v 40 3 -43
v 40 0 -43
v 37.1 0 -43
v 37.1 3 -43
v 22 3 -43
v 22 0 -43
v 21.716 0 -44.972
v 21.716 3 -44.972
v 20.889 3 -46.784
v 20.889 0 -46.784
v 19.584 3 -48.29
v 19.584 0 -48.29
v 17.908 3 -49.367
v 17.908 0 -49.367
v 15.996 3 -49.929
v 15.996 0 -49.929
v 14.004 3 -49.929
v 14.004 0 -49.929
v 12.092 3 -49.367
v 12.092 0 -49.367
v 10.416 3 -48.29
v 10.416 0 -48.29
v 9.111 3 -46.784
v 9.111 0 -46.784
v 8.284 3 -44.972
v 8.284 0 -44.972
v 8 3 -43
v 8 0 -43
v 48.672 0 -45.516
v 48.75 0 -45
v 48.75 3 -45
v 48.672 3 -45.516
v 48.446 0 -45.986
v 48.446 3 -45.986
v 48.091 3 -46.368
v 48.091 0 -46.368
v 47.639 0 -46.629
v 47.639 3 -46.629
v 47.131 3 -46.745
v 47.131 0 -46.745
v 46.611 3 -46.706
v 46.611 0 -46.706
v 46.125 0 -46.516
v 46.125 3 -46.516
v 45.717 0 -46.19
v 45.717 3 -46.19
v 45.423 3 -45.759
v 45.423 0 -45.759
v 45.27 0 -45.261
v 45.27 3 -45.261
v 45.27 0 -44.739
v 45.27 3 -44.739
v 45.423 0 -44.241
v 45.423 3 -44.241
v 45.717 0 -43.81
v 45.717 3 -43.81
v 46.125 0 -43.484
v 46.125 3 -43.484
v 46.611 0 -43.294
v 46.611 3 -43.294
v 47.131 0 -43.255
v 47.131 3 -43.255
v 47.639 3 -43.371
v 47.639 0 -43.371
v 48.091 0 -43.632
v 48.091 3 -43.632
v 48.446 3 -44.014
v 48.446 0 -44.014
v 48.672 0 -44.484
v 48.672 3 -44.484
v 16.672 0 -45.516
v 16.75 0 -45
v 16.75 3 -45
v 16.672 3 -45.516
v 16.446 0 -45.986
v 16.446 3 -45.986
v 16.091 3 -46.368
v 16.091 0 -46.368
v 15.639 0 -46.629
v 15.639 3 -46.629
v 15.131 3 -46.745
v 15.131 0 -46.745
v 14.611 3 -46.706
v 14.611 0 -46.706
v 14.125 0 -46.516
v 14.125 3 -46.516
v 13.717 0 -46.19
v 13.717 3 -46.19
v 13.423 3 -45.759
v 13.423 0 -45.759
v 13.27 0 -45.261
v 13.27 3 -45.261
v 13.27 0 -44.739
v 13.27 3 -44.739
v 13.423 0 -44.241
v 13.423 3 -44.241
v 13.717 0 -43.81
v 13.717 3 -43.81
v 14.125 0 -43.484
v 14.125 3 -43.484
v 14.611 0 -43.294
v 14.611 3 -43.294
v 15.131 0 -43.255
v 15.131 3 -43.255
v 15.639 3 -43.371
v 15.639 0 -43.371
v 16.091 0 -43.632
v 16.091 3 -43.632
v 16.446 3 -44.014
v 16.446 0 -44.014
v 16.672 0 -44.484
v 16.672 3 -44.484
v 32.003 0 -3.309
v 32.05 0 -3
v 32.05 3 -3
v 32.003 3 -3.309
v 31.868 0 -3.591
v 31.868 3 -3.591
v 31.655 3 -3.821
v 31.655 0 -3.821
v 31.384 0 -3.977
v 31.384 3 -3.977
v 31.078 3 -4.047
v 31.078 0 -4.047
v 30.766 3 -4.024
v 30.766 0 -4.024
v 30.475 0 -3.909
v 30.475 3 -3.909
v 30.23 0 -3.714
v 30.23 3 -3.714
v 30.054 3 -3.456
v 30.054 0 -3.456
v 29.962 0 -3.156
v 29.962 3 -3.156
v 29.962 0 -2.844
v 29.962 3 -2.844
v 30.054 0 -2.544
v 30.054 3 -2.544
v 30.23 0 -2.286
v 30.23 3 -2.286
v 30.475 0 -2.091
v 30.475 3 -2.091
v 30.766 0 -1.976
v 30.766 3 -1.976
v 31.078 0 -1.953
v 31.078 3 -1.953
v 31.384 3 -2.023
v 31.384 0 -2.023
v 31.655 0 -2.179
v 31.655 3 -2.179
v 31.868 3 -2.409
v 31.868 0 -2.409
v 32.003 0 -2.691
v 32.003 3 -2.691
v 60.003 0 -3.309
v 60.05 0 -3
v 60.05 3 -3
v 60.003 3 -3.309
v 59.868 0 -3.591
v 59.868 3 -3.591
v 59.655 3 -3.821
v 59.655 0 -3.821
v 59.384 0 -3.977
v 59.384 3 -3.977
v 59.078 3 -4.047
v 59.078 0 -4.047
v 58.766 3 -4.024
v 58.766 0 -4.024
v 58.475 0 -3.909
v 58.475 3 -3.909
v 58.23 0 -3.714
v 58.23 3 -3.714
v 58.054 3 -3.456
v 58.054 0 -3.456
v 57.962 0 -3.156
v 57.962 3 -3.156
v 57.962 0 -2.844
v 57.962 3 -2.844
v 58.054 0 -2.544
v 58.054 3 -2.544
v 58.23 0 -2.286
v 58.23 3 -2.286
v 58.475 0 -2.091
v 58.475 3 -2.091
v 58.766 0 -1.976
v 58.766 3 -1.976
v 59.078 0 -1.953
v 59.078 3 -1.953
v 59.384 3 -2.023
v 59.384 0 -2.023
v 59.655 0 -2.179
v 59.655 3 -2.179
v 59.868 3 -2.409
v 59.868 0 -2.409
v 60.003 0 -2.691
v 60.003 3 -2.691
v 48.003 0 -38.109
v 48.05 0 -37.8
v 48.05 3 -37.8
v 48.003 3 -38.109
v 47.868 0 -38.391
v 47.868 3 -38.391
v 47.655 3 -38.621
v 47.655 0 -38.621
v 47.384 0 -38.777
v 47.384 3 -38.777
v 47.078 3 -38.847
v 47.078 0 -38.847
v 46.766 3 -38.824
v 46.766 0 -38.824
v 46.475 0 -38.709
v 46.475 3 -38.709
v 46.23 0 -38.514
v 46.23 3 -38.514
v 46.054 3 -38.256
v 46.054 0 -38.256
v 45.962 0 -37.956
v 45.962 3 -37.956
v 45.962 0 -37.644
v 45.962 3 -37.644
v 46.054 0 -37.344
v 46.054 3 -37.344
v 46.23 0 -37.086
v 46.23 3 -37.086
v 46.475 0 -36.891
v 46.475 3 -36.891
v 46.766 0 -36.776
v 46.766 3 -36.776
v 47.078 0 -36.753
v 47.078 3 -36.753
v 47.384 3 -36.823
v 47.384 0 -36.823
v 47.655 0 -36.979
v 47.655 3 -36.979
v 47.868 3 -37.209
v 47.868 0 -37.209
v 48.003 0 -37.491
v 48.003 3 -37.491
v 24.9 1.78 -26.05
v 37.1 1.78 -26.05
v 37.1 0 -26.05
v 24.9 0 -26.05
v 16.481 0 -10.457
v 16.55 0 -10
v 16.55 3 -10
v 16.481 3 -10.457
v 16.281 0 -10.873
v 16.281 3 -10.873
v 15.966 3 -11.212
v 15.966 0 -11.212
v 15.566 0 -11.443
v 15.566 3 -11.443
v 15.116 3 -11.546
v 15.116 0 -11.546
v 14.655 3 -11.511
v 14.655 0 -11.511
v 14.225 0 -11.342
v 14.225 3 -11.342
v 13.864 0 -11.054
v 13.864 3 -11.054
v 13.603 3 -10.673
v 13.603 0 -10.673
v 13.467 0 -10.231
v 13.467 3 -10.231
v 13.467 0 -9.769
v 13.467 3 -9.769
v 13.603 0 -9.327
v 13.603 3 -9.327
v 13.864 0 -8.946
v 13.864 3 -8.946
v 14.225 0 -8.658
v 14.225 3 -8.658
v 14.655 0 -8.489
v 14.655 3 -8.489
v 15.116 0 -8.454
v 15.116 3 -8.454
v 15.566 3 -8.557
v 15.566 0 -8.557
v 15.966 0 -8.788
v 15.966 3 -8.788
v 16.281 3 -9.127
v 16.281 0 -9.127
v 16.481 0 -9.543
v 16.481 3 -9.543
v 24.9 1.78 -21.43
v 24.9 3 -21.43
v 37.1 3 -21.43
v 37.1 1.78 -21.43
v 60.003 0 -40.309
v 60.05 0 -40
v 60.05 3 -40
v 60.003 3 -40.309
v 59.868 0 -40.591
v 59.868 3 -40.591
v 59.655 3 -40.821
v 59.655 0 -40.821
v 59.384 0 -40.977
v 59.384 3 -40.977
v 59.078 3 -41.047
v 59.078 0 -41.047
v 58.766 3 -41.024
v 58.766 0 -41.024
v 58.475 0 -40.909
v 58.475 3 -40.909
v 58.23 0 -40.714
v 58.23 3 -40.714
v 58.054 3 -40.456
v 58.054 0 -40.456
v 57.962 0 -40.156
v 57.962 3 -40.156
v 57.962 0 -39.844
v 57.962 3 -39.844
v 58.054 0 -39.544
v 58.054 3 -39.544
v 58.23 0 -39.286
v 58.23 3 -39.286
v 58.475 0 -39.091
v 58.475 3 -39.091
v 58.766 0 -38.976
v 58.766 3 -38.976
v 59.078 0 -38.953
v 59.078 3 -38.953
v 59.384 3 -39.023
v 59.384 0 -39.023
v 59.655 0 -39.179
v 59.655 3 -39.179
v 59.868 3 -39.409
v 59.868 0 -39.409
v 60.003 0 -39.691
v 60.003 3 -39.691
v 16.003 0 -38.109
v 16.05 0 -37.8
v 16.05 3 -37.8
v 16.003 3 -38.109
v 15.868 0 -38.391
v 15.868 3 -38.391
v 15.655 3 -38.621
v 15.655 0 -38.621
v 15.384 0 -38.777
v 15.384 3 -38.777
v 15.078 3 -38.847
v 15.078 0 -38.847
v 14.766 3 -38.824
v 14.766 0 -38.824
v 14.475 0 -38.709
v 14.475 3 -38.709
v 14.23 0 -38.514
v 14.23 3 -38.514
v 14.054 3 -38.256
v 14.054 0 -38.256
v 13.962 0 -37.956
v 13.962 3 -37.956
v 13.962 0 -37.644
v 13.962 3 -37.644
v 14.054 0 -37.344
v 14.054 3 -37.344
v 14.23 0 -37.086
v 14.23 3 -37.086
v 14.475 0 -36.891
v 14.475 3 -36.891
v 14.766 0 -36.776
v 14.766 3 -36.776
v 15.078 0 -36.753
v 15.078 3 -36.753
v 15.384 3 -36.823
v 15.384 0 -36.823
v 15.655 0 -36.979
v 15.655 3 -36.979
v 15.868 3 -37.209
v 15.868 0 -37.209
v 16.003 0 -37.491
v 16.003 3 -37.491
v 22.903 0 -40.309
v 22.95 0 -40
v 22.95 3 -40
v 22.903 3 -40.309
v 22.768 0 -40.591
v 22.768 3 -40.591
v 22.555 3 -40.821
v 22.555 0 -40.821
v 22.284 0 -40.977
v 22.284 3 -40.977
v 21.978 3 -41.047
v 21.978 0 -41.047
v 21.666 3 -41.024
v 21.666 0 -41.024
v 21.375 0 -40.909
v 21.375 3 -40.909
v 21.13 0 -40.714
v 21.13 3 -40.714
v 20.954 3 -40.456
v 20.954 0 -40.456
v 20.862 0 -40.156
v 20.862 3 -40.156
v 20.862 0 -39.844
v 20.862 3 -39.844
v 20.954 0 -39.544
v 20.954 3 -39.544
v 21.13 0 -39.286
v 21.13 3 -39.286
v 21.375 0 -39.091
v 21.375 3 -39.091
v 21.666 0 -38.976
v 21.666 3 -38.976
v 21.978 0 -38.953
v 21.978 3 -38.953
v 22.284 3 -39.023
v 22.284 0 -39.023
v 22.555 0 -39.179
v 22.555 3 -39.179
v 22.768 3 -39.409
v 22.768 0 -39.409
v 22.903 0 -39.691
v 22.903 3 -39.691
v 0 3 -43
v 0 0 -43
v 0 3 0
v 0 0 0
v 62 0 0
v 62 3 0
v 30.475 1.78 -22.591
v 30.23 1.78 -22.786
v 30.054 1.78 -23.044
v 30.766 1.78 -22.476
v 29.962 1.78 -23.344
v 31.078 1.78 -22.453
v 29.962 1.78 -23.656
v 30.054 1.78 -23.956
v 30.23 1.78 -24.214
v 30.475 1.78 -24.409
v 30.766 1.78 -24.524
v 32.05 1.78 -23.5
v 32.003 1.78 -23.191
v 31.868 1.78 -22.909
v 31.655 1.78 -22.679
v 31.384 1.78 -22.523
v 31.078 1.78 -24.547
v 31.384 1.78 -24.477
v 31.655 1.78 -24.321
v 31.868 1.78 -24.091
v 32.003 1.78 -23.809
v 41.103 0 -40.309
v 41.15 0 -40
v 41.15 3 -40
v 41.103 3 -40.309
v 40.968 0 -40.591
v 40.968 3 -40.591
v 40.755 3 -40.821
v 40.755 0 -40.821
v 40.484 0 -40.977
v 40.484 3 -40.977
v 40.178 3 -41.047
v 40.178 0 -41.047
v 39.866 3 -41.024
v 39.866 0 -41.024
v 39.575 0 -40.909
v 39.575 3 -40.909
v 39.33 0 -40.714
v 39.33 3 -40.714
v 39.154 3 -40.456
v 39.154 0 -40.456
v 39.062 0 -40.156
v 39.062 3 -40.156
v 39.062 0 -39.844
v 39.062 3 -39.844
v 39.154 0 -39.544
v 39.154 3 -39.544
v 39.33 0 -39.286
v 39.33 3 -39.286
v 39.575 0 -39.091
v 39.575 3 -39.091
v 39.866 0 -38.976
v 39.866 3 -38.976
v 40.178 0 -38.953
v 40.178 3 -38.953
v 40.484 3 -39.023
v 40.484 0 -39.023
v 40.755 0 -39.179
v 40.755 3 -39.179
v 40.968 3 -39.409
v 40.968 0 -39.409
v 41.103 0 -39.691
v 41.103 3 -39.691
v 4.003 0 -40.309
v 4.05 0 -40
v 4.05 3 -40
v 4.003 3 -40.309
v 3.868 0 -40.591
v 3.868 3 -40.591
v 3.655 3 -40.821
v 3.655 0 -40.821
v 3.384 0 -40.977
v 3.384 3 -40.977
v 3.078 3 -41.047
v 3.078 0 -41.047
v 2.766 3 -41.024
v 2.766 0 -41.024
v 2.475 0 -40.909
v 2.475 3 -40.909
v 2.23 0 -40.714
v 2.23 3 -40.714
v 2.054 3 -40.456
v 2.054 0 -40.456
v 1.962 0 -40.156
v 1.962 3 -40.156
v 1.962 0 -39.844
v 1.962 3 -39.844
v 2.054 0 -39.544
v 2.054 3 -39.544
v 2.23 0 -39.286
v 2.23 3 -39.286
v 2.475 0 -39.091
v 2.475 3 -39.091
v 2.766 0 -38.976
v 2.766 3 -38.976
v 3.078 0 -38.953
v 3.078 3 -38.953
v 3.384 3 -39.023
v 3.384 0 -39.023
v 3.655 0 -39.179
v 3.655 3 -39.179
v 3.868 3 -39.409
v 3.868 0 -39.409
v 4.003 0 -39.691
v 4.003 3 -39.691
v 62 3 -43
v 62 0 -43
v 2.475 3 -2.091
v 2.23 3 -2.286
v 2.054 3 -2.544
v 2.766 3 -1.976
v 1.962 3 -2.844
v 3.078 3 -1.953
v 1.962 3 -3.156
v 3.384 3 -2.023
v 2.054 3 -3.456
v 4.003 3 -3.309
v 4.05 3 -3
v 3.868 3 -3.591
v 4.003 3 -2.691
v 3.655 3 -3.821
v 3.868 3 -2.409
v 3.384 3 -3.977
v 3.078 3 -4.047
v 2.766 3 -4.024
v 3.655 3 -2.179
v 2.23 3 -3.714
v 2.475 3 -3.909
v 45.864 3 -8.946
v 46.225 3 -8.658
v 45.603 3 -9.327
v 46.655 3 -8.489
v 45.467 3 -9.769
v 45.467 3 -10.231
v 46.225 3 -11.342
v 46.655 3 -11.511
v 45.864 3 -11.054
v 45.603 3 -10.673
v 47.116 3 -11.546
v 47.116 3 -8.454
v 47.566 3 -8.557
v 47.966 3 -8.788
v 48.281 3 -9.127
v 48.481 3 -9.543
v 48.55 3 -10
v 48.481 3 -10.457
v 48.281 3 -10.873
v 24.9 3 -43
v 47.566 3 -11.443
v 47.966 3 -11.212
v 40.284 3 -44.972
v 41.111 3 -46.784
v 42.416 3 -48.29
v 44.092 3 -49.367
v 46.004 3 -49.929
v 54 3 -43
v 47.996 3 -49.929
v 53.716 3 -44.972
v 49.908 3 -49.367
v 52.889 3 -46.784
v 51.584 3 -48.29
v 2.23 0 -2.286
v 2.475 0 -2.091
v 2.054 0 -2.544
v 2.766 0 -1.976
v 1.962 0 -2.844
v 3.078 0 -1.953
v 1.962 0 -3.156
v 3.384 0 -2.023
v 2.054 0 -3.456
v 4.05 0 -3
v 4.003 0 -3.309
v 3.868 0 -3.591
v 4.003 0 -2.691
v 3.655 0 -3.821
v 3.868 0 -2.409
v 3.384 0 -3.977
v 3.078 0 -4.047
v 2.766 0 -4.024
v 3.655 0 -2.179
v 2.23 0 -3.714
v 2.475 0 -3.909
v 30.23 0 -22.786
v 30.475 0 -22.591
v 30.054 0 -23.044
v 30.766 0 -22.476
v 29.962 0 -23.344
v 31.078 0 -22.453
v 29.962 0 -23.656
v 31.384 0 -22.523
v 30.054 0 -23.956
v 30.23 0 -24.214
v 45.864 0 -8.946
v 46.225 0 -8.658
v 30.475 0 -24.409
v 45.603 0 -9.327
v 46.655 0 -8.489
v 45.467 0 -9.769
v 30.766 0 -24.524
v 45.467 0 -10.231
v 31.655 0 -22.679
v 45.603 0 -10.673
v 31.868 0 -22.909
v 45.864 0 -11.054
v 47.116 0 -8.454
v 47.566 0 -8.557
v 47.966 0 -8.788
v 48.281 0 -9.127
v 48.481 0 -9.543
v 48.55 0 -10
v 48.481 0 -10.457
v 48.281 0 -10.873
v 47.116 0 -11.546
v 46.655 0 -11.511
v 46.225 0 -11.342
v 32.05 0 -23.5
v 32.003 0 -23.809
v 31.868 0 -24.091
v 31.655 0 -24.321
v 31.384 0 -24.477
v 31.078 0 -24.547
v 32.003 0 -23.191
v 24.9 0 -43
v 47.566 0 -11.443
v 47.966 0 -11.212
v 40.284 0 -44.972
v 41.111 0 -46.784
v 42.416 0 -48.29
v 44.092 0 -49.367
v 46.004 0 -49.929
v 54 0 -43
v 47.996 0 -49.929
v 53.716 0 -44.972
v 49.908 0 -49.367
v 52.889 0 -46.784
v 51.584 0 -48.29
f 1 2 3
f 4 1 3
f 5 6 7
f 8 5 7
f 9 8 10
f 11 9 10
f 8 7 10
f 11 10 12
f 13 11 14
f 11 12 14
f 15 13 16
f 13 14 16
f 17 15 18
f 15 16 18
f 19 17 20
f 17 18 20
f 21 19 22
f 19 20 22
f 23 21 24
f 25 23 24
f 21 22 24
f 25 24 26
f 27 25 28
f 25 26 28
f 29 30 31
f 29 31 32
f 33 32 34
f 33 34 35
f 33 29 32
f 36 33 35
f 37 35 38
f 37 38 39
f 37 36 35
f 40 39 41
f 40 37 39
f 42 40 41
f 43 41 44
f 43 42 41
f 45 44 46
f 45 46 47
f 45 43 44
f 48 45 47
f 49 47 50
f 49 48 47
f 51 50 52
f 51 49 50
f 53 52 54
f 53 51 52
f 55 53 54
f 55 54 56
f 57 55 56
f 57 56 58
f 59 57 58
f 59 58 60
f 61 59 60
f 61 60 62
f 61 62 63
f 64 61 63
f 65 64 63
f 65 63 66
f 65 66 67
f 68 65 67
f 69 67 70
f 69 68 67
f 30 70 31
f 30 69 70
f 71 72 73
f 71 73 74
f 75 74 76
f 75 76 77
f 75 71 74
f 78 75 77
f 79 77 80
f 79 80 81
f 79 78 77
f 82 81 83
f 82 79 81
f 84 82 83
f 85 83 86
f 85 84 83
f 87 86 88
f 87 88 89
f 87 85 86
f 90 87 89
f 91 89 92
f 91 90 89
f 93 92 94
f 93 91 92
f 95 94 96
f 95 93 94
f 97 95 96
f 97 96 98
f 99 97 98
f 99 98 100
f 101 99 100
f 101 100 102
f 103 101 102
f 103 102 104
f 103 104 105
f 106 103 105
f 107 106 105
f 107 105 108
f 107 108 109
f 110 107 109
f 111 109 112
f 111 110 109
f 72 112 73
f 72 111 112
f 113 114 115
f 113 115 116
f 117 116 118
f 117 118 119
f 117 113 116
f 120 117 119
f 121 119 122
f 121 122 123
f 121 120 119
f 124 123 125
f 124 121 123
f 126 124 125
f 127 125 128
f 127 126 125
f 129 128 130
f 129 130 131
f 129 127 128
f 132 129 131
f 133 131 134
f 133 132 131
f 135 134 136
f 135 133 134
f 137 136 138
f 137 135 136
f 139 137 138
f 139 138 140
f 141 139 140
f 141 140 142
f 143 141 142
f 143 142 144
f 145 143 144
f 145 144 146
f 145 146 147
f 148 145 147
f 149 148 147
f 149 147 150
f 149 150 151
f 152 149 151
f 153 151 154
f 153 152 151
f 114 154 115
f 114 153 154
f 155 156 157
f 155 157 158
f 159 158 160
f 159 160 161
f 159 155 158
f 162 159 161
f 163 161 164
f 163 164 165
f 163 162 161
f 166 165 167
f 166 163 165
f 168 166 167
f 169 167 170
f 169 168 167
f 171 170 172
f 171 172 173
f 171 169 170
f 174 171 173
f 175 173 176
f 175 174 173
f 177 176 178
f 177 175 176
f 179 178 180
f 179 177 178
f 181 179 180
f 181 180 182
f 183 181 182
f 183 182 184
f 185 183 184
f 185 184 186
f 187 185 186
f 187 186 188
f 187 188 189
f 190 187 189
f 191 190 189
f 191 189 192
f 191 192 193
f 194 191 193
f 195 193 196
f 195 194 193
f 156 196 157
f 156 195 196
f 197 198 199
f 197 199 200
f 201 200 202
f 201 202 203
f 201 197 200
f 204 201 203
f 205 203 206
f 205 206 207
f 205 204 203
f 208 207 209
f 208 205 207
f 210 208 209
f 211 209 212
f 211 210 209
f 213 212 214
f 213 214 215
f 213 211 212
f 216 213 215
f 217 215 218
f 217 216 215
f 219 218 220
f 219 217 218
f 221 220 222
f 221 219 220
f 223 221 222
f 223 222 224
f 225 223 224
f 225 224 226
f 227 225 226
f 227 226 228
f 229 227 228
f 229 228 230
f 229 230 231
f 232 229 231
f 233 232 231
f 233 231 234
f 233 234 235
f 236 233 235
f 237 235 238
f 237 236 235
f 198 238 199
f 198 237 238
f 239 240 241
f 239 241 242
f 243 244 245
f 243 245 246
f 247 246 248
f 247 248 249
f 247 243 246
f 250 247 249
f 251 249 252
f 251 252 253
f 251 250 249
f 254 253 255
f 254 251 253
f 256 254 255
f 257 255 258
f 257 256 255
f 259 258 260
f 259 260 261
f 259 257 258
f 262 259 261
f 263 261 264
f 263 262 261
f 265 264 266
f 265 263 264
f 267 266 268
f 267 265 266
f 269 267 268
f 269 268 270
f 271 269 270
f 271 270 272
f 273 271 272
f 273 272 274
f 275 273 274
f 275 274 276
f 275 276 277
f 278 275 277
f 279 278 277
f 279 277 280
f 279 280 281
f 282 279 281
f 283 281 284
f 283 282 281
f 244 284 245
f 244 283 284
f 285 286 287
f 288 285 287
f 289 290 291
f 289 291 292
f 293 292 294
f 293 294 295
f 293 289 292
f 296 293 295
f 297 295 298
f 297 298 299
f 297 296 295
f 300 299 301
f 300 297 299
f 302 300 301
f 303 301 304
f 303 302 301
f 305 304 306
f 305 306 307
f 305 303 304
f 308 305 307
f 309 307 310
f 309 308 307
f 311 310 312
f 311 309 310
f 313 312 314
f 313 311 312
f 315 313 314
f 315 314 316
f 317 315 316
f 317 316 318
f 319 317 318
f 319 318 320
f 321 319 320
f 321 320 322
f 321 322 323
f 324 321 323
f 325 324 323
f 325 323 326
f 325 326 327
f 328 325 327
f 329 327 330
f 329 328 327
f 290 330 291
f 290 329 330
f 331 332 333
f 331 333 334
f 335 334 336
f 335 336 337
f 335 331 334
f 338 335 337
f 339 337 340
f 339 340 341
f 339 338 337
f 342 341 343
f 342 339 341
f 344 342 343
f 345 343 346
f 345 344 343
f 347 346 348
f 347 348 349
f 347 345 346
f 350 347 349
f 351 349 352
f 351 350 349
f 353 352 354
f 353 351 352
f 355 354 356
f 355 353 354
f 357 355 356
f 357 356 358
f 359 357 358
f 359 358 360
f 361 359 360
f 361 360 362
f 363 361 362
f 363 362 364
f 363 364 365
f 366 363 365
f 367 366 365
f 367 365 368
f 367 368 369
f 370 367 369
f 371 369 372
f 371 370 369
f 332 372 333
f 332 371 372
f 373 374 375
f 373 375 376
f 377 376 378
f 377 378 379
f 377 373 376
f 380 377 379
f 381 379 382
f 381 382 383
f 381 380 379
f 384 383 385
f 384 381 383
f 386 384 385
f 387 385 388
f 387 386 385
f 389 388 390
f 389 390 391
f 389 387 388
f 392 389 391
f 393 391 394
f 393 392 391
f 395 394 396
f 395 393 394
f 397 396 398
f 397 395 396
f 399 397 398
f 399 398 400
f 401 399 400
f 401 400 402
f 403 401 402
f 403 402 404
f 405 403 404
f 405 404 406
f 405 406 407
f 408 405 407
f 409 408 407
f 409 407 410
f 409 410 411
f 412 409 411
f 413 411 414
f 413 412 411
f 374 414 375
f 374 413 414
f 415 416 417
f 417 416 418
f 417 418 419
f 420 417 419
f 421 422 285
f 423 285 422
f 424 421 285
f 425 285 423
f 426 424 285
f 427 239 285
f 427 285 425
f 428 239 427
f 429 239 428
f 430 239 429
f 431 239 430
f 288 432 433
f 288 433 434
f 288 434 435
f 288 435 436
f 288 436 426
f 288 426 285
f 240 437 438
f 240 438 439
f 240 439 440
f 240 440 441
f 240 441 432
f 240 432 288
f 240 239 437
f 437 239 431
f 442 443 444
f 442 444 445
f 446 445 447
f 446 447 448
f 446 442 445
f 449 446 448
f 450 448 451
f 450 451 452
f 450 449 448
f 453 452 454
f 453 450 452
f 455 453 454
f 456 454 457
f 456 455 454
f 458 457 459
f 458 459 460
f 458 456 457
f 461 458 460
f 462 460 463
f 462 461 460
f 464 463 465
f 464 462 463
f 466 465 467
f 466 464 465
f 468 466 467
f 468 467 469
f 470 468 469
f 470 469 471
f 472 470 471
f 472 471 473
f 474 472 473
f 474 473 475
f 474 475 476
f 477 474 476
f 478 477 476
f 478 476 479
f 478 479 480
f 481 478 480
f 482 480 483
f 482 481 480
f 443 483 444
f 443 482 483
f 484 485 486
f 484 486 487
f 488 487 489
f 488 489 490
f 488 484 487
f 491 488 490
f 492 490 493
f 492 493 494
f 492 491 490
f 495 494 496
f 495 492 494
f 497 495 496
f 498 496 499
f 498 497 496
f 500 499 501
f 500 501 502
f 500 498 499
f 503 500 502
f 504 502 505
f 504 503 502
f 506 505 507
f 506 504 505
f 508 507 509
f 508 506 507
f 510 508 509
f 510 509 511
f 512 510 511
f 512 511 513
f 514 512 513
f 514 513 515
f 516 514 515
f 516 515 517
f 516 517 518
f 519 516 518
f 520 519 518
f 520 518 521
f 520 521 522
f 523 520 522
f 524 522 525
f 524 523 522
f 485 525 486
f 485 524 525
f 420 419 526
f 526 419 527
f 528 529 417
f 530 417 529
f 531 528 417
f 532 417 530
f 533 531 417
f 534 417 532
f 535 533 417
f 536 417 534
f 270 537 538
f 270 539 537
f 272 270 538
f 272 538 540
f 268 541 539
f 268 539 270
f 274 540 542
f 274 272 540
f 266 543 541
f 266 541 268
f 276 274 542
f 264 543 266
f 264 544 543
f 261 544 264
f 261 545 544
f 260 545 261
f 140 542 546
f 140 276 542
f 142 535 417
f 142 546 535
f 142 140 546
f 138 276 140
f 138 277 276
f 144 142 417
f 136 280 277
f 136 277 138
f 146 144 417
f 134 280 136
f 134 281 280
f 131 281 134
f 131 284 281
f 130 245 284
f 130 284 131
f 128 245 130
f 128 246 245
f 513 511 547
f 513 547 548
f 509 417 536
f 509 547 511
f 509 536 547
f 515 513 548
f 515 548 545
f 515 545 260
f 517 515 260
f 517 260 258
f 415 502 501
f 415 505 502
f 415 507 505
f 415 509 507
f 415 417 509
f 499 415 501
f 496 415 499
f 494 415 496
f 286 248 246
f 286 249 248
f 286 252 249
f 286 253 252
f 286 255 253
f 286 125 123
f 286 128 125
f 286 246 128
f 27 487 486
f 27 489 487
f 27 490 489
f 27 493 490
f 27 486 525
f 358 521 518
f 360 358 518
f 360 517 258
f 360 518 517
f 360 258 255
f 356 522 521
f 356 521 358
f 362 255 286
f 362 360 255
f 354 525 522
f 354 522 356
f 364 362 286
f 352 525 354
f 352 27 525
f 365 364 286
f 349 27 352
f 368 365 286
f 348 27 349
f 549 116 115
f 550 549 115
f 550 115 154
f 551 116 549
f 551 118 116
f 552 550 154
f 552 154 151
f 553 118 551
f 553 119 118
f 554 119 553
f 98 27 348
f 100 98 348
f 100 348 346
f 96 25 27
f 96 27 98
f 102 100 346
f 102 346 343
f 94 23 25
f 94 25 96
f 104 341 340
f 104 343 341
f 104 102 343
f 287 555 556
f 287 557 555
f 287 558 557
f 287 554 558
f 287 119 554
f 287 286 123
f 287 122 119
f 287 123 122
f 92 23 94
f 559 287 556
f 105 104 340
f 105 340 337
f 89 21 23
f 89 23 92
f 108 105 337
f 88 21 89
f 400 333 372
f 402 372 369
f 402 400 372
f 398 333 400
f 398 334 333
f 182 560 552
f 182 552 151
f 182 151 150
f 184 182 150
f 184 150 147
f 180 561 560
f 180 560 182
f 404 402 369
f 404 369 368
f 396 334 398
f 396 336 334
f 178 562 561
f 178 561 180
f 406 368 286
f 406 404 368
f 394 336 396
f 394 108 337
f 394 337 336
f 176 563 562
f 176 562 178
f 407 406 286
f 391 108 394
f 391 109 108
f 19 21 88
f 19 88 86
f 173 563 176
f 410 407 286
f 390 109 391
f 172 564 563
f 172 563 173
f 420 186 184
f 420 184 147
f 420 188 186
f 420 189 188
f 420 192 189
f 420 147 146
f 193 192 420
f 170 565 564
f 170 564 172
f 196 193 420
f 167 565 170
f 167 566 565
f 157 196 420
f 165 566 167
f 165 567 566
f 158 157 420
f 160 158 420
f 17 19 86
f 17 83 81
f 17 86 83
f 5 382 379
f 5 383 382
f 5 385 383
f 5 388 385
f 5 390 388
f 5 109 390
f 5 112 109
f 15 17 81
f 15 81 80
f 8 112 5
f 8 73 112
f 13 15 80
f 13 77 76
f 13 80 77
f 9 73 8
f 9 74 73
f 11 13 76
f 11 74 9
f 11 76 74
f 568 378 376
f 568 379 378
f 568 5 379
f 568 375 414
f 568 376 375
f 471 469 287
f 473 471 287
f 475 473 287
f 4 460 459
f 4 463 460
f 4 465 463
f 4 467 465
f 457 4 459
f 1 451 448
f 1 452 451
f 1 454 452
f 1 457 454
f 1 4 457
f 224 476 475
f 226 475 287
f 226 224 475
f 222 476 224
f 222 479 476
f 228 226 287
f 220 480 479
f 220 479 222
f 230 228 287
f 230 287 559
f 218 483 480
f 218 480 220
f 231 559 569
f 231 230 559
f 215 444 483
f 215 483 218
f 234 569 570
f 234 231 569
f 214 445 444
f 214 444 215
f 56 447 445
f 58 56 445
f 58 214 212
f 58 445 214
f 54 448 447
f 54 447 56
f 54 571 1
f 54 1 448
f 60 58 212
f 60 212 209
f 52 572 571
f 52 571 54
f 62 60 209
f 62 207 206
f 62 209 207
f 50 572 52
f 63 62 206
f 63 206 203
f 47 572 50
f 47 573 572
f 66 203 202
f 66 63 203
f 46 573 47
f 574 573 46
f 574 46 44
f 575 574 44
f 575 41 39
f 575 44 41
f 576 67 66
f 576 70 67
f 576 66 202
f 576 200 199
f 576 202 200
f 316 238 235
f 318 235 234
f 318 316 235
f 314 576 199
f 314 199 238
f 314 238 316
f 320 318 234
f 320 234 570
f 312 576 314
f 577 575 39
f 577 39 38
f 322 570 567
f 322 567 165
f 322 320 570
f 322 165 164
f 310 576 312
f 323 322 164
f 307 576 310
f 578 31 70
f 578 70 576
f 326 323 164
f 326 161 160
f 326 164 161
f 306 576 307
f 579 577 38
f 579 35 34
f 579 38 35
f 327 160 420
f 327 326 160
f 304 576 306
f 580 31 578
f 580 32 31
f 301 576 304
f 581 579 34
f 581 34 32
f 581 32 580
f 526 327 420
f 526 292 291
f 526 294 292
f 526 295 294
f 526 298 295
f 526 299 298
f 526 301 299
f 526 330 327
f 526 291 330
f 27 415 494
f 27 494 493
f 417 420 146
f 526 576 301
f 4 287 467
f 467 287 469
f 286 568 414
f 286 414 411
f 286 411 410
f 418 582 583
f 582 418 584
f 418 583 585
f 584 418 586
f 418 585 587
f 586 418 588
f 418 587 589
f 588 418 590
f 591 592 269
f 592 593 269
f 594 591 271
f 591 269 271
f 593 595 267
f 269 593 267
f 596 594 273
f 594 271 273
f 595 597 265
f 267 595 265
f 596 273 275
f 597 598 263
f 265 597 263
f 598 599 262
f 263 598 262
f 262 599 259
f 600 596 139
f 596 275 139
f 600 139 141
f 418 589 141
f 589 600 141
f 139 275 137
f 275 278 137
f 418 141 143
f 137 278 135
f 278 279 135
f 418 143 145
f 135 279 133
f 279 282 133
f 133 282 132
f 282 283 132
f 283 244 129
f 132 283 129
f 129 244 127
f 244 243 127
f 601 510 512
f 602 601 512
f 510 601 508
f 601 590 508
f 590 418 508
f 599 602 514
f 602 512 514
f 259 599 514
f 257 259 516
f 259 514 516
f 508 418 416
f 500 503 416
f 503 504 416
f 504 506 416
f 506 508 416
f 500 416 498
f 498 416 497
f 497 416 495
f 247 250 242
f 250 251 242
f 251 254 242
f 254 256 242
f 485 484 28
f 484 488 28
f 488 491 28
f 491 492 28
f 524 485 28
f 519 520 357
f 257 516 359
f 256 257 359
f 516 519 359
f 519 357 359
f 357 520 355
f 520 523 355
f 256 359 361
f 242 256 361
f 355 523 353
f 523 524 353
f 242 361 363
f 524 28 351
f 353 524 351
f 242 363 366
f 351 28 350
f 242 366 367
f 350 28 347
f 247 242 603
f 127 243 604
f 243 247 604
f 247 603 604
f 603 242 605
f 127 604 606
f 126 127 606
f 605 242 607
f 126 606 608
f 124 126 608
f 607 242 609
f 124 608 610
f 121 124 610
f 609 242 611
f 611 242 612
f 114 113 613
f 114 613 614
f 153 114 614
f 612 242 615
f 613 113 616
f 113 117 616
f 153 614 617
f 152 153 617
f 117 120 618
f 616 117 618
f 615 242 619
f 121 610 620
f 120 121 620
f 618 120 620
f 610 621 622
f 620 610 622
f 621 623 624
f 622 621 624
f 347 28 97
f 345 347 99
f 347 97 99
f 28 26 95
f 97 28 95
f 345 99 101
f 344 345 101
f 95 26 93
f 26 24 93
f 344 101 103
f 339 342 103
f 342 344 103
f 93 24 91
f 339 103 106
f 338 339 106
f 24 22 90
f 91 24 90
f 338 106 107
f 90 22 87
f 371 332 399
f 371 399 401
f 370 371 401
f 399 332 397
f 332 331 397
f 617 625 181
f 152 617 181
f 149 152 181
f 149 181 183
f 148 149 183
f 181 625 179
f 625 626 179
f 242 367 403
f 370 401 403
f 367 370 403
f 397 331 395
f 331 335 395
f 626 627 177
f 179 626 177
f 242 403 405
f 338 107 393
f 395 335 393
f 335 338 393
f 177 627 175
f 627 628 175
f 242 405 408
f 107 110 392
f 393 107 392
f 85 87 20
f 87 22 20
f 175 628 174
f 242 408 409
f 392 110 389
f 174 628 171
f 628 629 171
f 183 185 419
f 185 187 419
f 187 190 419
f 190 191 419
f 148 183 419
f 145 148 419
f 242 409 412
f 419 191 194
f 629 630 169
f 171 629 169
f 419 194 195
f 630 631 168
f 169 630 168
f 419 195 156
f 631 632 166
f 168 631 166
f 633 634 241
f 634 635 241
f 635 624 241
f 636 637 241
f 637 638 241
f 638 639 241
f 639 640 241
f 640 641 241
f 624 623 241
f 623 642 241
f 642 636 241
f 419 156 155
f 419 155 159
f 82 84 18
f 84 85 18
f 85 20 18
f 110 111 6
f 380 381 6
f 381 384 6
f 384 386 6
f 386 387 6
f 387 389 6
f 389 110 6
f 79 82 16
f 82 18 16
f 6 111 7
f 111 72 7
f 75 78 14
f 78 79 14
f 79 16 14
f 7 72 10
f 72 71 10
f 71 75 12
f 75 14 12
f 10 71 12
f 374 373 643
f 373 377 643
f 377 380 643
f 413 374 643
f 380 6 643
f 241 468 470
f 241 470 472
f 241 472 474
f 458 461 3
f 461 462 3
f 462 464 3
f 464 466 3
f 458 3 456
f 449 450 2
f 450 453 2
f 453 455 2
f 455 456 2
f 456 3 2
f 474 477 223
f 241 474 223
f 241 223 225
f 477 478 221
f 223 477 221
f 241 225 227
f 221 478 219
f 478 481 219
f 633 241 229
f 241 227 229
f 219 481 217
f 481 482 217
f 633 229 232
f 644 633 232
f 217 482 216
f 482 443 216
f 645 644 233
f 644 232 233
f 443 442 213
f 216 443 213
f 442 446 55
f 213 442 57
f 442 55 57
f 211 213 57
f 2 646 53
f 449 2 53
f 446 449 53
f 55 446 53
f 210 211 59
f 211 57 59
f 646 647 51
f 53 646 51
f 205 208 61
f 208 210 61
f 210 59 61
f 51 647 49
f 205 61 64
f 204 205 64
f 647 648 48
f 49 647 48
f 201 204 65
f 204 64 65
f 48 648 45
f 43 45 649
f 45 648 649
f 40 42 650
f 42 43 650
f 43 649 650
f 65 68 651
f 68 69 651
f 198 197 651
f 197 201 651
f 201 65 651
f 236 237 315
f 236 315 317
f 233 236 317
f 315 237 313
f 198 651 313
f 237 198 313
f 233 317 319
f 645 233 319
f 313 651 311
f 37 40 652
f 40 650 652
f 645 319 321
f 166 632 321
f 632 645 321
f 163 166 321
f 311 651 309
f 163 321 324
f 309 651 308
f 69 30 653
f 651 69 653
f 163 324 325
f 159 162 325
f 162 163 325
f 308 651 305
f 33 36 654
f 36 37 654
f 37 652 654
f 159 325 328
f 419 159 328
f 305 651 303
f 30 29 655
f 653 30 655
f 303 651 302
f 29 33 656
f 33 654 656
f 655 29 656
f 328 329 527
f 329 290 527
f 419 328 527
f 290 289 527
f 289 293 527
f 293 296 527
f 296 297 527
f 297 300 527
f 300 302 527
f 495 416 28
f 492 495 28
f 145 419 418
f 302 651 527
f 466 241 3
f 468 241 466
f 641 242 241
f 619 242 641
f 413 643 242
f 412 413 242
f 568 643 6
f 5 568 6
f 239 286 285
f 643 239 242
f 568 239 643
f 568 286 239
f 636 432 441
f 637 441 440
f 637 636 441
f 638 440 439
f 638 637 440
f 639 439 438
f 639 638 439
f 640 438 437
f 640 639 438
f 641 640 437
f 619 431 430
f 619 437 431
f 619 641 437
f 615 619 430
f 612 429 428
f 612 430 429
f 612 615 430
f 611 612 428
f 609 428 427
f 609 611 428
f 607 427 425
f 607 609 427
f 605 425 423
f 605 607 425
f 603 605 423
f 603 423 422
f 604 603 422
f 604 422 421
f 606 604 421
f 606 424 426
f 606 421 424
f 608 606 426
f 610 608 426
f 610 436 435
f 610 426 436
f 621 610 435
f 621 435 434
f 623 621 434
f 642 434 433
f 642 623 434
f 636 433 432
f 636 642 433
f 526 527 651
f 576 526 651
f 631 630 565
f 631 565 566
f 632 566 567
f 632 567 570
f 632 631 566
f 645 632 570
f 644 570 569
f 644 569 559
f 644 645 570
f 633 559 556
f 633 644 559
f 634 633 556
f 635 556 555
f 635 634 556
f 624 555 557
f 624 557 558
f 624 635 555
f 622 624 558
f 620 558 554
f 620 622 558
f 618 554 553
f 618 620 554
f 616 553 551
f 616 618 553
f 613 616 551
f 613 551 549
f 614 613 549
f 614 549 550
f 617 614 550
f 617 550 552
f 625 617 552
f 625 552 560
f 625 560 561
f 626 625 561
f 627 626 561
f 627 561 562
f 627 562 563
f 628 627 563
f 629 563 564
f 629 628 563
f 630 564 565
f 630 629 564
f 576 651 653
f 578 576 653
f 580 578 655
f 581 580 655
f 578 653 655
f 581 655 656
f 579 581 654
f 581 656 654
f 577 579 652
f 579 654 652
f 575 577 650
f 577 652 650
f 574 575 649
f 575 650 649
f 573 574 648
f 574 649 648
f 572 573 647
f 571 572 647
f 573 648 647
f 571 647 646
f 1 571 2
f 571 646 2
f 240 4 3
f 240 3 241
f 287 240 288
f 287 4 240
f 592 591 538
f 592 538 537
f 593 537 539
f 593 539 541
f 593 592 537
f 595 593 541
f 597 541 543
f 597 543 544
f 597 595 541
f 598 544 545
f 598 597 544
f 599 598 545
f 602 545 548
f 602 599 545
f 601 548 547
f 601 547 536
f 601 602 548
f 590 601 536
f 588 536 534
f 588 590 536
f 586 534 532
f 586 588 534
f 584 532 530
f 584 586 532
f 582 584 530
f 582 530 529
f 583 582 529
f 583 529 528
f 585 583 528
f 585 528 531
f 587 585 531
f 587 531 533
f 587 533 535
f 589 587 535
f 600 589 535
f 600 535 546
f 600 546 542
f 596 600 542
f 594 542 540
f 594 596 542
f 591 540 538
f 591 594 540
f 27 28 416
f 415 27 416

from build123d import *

# Parameters (mm, degrees)
SKETCH_1_R               = 1.05
SKETCH_1_R_2             = 1.55
SKETCH_1_R_3             = 1.75
EXTRUDE_1_DEPTH          = 3
CUT_EXTRUDE_1_DEPTH      = 10
SKETCH_5_W               = 12.2
SKETCH_5_H               = 4.62
CUT_EXTRUDE_3_DEPTH      = 1
CUT_EXTRUDE_3_DEPTH_BACK = 1.22


with BuildPart() as part:
    # 草图1 → 凸台-拉伸1 (new body)
    with BuildSketch(Plane(origin=(0, 0, 0), x_dir=(1, 0, 0), z_dir=(0, 1, 0))):
        with BuildLine():
            Line((0, 43), (0, 0))
            Line((0, 0), (62, 0))
            Line((62, 0), (62, 43))
            Line((62, 43), (54, 43))
            ThreePointArc((54, 43), (47, 50), (40, 43))
            Line((40, 43), (22, 43))
            ThreePointArc((22, 43), (15, 50), (8, 43))
            Line((8, 43), (0, 43))
        make_face()
        with Locations((3, 3)):
            Circle(SKETCH_1_R, mode=Mode.SUBTRACT)
        with Locations((15, 10)):
            Circle(SKETCH_1_R_2, mode=Mode.SUBTRACT)
        with Locations((31, 3)):
            Circle(SKETCH_1_R, mode=Mode.SUBTRACT)
        with Locations((59, 3)):
            Circle(SKETCH_1_R, mode=Mode.SUBTRACT)
        with Locations((47, 10)):
            Circle(SKETCH_1_R_2, mode=Mode.SUBTRACT)
        with Locations((31, 23.5)):
            Circle(SKETCH_1_R, mode=Mode.SUBTRACT)
        with Locations((3, 40)):
            Circle(SKETCH_1_R, mode=Mode.SUBTRACT)
        with Locations((15, 37.8)):
            Circle(SKETCH_1_R, mode=Mode.SUBTRACT)
        with Locations((21.9, 40)):
            Circle(SKETCH_1_R, mode=Mode.SUBTRACT)
        with Locations((40.1, 40)):
            Circle(SKETCH_1_R, mode=Mode.SUBTRACT)
        with Locations((47, 37.8)):
            Circle(SKETCH_1_R, mode=Mode.SUBTRACT)
        with Locations((59, 40)):
            Circle(SKETCH_1_R, mode=Mode.SUBTRACT)
        with Locations((15, 45)):
            Circle(SKETCH_1_R_3, mode=Mode.SUBTRACT)
        with Locations((47, 45)):
            Circle(SKETCH_1_R_3, mode=Mode.SUBTRACT)
    extrude(amount=EXTRUDE_1_DEPTH)

    # 草图2 → 切除-拉伸1 (cut)
    with BuildSketch(Plane(origin=(0, 3, 0), x_dir=(1, 0, 0), z_dir=(0, 1, 0))):
        Polygon((31, 43), (37.1, 43), (37.1, 26.05), (24.9, 26.05), (24.9, 43), align=None)
    extrude(amount=-CUT_EXTRUDE_1_DEPTH, mode=Mode.SUBTRACT)

    # 草图5 → 切除-拉伸3 (cut, two sides)
    with BuildSketch(Plane(origin=(0, 3, 0), x_dir=(1, 0, 0), z_dir=(0, 1, 0))) as cut_extrude_3_sk:
        with Locations((31, 23.74)):
            Rectangle(SKETCH_5_W, SKETCH_5_H)
    extrude(amount=CUT_EXTRUDE_3_DEPTH, mode=Mode.SUBTRACT)
    extrude(cut_extrude_3_sk.sketch, amount=-CUT_EXTRUDE_3_DEPTH_BACK, mode=Mode.SUBTRACT)


solid = part.part
